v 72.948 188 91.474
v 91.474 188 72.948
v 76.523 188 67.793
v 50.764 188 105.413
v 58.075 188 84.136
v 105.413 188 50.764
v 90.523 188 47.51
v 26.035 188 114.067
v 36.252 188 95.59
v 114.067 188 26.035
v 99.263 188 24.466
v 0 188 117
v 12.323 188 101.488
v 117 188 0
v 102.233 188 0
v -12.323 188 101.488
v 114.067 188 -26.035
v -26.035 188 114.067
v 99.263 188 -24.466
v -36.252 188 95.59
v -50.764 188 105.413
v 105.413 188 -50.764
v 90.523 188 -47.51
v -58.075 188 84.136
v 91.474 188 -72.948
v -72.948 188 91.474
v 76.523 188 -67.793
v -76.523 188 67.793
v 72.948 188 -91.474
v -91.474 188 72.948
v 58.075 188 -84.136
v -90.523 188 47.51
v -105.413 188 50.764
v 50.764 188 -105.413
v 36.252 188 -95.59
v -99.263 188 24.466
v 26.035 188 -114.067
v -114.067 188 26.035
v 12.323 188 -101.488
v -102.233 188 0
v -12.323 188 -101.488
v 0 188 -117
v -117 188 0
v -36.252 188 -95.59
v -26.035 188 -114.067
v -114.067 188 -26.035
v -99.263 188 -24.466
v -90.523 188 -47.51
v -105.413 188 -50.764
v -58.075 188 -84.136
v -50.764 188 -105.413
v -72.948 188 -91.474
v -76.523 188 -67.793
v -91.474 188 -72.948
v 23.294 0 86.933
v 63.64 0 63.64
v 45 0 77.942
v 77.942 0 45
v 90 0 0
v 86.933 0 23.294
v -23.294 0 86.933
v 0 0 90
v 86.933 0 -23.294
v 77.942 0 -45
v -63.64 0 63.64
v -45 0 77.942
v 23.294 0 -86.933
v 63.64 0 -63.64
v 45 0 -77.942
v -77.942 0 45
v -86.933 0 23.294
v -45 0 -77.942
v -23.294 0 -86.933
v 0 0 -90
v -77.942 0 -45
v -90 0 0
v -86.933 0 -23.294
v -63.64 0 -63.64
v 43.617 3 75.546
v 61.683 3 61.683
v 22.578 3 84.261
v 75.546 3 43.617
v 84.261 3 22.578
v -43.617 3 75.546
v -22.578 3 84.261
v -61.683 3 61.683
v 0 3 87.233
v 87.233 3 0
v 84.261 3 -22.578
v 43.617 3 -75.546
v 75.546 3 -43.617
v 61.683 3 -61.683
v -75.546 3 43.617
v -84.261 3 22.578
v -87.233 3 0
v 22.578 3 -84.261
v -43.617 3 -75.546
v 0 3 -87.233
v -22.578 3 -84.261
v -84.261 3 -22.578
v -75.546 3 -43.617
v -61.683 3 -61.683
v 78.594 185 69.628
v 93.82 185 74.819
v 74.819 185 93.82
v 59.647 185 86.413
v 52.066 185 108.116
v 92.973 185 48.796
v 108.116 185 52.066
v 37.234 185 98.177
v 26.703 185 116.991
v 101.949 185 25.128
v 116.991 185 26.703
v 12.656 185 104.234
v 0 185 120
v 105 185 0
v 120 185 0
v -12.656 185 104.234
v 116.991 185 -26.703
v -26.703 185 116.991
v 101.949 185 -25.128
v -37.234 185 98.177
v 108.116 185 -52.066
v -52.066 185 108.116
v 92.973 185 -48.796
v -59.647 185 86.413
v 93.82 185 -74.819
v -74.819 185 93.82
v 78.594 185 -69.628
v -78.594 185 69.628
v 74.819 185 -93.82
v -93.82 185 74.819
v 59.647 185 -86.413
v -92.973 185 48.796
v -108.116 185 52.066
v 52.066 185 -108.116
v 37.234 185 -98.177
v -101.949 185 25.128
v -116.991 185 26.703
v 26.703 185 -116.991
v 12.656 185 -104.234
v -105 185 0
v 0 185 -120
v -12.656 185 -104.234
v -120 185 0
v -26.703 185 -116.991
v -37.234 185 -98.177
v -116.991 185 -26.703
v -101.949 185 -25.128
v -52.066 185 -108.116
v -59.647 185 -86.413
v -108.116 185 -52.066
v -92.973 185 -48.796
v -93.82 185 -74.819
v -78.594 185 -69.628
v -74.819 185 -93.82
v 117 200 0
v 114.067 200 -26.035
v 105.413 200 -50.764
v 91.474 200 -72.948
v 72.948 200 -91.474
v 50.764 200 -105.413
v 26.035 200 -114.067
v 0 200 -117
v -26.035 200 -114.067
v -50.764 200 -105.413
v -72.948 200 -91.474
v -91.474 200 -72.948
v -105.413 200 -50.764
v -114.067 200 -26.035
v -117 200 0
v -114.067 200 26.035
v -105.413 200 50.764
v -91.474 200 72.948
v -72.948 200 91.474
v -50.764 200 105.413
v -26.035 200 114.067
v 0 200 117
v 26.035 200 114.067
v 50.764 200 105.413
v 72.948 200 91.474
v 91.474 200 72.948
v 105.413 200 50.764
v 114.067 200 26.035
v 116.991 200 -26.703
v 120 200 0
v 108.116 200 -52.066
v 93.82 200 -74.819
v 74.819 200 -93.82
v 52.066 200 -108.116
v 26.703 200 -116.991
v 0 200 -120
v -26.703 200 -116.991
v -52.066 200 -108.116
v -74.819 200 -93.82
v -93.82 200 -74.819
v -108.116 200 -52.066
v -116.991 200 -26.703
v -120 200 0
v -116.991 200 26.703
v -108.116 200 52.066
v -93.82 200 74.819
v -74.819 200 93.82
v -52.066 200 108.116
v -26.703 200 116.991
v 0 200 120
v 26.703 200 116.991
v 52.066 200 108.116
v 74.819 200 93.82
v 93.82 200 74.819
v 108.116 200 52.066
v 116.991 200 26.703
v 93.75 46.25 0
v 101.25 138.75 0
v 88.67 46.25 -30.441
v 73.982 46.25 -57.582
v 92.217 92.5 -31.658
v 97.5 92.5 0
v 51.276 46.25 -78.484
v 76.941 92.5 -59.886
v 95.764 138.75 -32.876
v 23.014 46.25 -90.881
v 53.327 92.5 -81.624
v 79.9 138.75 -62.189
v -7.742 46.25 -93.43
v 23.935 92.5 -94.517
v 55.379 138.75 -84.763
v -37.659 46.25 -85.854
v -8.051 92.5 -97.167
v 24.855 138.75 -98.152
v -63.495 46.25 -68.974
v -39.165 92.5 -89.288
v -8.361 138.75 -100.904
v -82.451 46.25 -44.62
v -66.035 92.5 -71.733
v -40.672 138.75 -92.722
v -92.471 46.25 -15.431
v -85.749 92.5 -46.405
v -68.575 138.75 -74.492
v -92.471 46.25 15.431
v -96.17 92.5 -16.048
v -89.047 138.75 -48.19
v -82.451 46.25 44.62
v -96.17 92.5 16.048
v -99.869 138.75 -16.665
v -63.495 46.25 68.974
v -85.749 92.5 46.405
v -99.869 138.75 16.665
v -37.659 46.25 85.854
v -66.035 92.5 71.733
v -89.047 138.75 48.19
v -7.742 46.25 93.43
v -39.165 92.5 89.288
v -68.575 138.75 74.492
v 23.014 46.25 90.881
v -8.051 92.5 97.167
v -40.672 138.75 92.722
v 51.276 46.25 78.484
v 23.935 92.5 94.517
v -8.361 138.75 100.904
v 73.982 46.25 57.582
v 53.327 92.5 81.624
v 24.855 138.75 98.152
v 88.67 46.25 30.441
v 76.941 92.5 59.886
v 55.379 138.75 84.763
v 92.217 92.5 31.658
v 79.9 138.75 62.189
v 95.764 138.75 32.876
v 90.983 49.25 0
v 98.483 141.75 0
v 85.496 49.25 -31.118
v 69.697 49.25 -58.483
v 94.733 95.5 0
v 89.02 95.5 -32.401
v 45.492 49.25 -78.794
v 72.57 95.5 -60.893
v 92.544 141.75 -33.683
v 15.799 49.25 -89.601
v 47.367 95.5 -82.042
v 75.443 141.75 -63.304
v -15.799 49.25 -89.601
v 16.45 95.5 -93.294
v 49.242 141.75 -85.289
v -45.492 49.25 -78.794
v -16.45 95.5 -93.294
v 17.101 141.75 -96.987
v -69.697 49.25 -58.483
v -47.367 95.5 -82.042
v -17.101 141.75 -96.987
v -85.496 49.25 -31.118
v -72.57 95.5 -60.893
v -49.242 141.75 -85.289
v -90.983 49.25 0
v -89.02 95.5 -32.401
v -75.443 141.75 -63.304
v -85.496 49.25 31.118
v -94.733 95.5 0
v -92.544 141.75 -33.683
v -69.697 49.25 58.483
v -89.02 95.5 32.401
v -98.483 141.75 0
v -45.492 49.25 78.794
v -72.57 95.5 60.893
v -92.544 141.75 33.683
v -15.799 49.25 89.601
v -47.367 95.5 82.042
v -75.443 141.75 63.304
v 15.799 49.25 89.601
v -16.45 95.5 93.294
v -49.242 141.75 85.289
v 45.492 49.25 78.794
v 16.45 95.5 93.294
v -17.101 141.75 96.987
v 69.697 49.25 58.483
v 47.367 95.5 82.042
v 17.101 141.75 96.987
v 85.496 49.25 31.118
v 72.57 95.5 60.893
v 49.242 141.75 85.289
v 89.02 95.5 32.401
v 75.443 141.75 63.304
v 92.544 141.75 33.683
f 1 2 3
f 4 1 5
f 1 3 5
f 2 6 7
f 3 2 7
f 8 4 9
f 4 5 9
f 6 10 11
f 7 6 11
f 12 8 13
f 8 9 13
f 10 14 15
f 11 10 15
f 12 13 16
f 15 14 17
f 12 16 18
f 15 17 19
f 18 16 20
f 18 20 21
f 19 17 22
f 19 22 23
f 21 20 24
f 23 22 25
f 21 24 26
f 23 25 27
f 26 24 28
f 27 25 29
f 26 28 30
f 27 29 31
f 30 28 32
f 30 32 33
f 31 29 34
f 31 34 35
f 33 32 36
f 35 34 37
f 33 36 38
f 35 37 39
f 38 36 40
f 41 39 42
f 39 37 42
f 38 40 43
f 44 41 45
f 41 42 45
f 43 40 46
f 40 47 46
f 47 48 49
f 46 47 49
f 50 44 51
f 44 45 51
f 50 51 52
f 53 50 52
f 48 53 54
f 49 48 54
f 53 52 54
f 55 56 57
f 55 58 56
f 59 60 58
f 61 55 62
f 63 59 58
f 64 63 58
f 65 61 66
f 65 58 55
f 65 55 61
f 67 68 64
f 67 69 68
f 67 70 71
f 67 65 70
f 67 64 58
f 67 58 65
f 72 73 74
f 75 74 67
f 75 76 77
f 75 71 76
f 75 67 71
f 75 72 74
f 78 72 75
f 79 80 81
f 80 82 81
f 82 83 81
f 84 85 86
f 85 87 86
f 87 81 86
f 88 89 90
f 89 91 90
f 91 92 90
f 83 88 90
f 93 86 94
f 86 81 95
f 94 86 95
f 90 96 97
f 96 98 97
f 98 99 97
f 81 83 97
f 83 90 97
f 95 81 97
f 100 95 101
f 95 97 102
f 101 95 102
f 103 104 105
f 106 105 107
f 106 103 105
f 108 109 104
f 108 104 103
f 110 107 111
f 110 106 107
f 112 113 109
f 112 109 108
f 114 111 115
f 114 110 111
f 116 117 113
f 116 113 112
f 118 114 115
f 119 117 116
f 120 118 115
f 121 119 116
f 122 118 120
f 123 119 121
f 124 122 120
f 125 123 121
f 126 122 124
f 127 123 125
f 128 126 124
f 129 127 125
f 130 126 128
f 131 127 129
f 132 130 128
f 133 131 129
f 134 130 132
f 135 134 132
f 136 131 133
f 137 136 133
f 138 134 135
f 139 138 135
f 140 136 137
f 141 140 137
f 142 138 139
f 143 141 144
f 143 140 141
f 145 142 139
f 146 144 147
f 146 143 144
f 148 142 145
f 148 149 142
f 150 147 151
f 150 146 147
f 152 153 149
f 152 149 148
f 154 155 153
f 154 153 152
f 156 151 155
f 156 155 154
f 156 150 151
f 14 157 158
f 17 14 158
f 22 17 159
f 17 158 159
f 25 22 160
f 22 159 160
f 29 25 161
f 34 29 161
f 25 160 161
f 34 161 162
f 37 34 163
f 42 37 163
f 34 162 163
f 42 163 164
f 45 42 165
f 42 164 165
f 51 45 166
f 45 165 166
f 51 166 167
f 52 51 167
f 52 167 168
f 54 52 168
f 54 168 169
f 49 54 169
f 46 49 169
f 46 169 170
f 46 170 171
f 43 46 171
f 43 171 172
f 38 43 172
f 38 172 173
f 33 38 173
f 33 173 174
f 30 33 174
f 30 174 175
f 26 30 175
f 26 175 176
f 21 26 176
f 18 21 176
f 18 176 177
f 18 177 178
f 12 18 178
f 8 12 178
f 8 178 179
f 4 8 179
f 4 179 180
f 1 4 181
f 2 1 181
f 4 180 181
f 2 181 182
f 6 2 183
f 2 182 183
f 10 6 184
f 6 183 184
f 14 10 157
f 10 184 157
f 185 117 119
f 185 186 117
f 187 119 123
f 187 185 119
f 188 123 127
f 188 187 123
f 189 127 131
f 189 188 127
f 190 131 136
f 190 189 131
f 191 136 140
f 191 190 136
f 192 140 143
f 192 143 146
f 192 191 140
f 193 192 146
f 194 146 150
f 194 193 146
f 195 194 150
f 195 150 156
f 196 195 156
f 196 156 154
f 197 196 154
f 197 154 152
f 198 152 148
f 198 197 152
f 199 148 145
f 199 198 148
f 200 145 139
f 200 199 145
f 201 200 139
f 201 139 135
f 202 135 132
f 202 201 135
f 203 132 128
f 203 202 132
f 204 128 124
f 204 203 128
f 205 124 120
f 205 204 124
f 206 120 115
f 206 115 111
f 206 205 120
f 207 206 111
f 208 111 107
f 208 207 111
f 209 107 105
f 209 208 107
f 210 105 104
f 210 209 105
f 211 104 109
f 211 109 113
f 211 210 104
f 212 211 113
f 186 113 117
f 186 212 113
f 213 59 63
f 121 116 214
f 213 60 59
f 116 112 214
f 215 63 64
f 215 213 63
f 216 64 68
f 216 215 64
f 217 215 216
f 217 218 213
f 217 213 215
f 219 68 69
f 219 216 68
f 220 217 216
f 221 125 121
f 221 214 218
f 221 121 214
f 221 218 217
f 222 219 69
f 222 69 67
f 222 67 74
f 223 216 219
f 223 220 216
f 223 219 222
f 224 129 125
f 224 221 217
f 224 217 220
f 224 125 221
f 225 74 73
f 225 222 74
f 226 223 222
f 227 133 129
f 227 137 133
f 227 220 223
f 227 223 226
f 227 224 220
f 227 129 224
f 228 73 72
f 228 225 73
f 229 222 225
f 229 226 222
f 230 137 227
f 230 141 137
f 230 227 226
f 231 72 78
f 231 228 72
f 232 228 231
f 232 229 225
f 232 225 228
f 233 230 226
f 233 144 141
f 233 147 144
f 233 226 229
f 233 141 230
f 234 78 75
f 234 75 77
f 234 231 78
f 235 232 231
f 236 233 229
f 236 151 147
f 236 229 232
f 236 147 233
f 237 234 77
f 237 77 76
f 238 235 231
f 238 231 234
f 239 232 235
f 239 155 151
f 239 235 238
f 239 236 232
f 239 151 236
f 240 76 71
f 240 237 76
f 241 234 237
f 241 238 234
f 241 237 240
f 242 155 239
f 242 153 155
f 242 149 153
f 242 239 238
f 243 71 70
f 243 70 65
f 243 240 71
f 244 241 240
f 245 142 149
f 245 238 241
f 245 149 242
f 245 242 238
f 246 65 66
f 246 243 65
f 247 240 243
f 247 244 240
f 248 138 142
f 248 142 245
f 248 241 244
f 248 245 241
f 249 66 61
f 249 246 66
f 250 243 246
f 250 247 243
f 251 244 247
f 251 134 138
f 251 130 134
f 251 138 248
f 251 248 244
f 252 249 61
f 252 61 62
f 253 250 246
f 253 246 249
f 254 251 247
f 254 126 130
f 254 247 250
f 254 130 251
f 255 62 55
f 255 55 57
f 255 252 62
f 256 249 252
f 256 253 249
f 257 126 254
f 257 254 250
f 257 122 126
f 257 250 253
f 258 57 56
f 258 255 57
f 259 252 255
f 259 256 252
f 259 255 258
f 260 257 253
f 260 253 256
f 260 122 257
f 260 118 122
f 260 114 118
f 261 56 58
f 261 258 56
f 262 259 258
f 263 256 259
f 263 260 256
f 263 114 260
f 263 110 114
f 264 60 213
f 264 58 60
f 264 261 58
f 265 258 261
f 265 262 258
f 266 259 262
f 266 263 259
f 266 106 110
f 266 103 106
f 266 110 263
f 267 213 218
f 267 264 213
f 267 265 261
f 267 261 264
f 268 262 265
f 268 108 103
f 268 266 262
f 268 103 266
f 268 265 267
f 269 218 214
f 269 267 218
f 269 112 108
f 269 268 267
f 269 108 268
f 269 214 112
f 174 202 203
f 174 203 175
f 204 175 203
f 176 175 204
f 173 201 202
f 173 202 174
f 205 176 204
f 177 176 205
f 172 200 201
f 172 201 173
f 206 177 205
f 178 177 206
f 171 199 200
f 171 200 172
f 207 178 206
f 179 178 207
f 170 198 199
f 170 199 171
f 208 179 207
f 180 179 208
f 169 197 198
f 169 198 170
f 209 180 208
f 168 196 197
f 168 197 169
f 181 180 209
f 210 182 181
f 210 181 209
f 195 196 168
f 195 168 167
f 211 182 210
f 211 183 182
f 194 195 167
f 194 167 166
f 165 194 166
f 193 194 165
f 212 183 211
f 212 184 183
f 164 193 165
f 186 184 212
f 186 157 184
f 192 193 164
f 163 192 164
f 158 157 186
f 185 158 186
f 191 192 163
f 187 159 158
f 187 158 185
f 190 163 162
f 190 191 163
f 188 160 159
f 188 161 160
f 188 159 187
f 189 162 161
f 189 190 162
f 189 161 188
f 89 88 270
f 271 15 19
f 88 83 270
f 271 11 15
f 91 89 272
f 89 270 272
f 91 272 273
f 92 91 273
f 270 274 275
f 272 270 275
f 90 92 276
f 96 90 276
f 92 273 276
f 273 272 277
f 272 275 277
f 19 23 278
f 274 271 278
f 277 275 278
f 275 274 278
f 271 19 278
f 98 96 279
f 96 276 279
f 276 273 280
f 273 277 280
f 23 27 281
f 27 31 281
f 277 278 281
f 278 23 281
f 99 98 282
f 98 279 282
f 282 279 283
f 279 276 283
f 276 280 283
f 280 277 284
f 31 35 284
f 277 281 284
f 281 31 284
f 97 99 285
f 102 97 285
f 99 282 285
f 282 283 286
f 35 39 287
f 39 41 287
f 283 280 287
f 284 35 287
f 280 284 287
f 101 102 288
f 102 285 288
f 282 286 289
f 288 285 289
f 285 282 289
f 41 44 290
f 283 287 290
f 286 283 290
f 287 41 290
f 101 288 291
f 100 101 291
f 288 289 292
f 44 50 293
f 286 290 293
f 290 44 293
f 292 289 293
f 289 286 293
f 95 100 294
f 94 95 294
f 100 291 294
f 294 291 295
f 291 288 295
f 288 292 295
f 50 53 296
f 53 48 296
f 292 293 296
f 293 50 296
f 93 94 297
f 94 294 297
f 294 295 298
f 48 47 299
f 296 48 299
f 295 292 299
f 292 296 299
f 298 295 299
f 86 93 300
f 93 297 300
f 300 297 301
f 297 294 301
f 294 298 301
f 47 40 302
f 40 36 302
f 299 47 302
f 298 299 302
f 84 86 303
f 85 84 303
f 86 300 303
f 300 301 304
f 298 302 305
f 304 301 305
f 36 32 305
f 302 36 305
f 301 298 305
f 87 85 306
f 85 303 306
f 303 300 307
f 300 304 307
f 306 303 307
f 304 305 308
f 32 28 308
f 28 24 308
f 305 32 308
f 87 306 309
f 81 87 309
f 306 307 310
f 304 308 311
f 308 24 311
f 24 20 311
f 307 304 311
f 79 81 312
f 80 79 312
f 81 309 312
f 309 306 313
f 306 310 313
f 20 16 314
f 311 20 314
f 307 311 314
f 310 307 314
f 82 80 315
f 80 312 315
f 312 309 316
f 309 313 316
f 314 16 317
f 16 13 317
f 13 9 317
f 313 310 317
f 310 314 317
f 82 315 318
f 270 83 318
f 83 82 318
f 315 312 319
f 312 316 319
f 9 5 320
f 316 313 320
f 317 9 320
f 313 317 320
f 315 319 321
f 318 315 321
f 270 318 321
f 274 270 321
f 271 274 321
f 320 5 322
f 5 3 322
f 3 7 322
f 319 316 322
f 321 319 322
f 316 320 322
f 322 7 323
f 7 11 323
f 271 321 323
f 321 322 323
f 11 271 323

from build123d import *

# Parameters (mm, degrees)
SHELL_1_T = -3


with BuildPart() as part:
    # 草图1 → 旋转1 (revolve)
    with BuildSketch(Plane.XY, mode=Mode.PRIVATE) as revolve_1_sk:
        Polygon((0, 0), (-90, 0), (-105, 185), (-120, 185), (-120, 200), (0, 200), align=None)
    revolve(revolve_1_sk.sketch.rotate(Axis((0, -878.981608445, 0), (0, 1, 0)), 180), axis=Axis((0, -878.981608445, 0), (0, 1, 0)))

    # 抽壳1
    shell_1_openings = [part.faces().sort_by_distance(p)[0] for p in [
        (0, 200, 0),
    ]]
    offset(amount=SHELL_1_T, openings=shell_1_openings, kind=Kind.INTERSECTION)


solid = part.part
